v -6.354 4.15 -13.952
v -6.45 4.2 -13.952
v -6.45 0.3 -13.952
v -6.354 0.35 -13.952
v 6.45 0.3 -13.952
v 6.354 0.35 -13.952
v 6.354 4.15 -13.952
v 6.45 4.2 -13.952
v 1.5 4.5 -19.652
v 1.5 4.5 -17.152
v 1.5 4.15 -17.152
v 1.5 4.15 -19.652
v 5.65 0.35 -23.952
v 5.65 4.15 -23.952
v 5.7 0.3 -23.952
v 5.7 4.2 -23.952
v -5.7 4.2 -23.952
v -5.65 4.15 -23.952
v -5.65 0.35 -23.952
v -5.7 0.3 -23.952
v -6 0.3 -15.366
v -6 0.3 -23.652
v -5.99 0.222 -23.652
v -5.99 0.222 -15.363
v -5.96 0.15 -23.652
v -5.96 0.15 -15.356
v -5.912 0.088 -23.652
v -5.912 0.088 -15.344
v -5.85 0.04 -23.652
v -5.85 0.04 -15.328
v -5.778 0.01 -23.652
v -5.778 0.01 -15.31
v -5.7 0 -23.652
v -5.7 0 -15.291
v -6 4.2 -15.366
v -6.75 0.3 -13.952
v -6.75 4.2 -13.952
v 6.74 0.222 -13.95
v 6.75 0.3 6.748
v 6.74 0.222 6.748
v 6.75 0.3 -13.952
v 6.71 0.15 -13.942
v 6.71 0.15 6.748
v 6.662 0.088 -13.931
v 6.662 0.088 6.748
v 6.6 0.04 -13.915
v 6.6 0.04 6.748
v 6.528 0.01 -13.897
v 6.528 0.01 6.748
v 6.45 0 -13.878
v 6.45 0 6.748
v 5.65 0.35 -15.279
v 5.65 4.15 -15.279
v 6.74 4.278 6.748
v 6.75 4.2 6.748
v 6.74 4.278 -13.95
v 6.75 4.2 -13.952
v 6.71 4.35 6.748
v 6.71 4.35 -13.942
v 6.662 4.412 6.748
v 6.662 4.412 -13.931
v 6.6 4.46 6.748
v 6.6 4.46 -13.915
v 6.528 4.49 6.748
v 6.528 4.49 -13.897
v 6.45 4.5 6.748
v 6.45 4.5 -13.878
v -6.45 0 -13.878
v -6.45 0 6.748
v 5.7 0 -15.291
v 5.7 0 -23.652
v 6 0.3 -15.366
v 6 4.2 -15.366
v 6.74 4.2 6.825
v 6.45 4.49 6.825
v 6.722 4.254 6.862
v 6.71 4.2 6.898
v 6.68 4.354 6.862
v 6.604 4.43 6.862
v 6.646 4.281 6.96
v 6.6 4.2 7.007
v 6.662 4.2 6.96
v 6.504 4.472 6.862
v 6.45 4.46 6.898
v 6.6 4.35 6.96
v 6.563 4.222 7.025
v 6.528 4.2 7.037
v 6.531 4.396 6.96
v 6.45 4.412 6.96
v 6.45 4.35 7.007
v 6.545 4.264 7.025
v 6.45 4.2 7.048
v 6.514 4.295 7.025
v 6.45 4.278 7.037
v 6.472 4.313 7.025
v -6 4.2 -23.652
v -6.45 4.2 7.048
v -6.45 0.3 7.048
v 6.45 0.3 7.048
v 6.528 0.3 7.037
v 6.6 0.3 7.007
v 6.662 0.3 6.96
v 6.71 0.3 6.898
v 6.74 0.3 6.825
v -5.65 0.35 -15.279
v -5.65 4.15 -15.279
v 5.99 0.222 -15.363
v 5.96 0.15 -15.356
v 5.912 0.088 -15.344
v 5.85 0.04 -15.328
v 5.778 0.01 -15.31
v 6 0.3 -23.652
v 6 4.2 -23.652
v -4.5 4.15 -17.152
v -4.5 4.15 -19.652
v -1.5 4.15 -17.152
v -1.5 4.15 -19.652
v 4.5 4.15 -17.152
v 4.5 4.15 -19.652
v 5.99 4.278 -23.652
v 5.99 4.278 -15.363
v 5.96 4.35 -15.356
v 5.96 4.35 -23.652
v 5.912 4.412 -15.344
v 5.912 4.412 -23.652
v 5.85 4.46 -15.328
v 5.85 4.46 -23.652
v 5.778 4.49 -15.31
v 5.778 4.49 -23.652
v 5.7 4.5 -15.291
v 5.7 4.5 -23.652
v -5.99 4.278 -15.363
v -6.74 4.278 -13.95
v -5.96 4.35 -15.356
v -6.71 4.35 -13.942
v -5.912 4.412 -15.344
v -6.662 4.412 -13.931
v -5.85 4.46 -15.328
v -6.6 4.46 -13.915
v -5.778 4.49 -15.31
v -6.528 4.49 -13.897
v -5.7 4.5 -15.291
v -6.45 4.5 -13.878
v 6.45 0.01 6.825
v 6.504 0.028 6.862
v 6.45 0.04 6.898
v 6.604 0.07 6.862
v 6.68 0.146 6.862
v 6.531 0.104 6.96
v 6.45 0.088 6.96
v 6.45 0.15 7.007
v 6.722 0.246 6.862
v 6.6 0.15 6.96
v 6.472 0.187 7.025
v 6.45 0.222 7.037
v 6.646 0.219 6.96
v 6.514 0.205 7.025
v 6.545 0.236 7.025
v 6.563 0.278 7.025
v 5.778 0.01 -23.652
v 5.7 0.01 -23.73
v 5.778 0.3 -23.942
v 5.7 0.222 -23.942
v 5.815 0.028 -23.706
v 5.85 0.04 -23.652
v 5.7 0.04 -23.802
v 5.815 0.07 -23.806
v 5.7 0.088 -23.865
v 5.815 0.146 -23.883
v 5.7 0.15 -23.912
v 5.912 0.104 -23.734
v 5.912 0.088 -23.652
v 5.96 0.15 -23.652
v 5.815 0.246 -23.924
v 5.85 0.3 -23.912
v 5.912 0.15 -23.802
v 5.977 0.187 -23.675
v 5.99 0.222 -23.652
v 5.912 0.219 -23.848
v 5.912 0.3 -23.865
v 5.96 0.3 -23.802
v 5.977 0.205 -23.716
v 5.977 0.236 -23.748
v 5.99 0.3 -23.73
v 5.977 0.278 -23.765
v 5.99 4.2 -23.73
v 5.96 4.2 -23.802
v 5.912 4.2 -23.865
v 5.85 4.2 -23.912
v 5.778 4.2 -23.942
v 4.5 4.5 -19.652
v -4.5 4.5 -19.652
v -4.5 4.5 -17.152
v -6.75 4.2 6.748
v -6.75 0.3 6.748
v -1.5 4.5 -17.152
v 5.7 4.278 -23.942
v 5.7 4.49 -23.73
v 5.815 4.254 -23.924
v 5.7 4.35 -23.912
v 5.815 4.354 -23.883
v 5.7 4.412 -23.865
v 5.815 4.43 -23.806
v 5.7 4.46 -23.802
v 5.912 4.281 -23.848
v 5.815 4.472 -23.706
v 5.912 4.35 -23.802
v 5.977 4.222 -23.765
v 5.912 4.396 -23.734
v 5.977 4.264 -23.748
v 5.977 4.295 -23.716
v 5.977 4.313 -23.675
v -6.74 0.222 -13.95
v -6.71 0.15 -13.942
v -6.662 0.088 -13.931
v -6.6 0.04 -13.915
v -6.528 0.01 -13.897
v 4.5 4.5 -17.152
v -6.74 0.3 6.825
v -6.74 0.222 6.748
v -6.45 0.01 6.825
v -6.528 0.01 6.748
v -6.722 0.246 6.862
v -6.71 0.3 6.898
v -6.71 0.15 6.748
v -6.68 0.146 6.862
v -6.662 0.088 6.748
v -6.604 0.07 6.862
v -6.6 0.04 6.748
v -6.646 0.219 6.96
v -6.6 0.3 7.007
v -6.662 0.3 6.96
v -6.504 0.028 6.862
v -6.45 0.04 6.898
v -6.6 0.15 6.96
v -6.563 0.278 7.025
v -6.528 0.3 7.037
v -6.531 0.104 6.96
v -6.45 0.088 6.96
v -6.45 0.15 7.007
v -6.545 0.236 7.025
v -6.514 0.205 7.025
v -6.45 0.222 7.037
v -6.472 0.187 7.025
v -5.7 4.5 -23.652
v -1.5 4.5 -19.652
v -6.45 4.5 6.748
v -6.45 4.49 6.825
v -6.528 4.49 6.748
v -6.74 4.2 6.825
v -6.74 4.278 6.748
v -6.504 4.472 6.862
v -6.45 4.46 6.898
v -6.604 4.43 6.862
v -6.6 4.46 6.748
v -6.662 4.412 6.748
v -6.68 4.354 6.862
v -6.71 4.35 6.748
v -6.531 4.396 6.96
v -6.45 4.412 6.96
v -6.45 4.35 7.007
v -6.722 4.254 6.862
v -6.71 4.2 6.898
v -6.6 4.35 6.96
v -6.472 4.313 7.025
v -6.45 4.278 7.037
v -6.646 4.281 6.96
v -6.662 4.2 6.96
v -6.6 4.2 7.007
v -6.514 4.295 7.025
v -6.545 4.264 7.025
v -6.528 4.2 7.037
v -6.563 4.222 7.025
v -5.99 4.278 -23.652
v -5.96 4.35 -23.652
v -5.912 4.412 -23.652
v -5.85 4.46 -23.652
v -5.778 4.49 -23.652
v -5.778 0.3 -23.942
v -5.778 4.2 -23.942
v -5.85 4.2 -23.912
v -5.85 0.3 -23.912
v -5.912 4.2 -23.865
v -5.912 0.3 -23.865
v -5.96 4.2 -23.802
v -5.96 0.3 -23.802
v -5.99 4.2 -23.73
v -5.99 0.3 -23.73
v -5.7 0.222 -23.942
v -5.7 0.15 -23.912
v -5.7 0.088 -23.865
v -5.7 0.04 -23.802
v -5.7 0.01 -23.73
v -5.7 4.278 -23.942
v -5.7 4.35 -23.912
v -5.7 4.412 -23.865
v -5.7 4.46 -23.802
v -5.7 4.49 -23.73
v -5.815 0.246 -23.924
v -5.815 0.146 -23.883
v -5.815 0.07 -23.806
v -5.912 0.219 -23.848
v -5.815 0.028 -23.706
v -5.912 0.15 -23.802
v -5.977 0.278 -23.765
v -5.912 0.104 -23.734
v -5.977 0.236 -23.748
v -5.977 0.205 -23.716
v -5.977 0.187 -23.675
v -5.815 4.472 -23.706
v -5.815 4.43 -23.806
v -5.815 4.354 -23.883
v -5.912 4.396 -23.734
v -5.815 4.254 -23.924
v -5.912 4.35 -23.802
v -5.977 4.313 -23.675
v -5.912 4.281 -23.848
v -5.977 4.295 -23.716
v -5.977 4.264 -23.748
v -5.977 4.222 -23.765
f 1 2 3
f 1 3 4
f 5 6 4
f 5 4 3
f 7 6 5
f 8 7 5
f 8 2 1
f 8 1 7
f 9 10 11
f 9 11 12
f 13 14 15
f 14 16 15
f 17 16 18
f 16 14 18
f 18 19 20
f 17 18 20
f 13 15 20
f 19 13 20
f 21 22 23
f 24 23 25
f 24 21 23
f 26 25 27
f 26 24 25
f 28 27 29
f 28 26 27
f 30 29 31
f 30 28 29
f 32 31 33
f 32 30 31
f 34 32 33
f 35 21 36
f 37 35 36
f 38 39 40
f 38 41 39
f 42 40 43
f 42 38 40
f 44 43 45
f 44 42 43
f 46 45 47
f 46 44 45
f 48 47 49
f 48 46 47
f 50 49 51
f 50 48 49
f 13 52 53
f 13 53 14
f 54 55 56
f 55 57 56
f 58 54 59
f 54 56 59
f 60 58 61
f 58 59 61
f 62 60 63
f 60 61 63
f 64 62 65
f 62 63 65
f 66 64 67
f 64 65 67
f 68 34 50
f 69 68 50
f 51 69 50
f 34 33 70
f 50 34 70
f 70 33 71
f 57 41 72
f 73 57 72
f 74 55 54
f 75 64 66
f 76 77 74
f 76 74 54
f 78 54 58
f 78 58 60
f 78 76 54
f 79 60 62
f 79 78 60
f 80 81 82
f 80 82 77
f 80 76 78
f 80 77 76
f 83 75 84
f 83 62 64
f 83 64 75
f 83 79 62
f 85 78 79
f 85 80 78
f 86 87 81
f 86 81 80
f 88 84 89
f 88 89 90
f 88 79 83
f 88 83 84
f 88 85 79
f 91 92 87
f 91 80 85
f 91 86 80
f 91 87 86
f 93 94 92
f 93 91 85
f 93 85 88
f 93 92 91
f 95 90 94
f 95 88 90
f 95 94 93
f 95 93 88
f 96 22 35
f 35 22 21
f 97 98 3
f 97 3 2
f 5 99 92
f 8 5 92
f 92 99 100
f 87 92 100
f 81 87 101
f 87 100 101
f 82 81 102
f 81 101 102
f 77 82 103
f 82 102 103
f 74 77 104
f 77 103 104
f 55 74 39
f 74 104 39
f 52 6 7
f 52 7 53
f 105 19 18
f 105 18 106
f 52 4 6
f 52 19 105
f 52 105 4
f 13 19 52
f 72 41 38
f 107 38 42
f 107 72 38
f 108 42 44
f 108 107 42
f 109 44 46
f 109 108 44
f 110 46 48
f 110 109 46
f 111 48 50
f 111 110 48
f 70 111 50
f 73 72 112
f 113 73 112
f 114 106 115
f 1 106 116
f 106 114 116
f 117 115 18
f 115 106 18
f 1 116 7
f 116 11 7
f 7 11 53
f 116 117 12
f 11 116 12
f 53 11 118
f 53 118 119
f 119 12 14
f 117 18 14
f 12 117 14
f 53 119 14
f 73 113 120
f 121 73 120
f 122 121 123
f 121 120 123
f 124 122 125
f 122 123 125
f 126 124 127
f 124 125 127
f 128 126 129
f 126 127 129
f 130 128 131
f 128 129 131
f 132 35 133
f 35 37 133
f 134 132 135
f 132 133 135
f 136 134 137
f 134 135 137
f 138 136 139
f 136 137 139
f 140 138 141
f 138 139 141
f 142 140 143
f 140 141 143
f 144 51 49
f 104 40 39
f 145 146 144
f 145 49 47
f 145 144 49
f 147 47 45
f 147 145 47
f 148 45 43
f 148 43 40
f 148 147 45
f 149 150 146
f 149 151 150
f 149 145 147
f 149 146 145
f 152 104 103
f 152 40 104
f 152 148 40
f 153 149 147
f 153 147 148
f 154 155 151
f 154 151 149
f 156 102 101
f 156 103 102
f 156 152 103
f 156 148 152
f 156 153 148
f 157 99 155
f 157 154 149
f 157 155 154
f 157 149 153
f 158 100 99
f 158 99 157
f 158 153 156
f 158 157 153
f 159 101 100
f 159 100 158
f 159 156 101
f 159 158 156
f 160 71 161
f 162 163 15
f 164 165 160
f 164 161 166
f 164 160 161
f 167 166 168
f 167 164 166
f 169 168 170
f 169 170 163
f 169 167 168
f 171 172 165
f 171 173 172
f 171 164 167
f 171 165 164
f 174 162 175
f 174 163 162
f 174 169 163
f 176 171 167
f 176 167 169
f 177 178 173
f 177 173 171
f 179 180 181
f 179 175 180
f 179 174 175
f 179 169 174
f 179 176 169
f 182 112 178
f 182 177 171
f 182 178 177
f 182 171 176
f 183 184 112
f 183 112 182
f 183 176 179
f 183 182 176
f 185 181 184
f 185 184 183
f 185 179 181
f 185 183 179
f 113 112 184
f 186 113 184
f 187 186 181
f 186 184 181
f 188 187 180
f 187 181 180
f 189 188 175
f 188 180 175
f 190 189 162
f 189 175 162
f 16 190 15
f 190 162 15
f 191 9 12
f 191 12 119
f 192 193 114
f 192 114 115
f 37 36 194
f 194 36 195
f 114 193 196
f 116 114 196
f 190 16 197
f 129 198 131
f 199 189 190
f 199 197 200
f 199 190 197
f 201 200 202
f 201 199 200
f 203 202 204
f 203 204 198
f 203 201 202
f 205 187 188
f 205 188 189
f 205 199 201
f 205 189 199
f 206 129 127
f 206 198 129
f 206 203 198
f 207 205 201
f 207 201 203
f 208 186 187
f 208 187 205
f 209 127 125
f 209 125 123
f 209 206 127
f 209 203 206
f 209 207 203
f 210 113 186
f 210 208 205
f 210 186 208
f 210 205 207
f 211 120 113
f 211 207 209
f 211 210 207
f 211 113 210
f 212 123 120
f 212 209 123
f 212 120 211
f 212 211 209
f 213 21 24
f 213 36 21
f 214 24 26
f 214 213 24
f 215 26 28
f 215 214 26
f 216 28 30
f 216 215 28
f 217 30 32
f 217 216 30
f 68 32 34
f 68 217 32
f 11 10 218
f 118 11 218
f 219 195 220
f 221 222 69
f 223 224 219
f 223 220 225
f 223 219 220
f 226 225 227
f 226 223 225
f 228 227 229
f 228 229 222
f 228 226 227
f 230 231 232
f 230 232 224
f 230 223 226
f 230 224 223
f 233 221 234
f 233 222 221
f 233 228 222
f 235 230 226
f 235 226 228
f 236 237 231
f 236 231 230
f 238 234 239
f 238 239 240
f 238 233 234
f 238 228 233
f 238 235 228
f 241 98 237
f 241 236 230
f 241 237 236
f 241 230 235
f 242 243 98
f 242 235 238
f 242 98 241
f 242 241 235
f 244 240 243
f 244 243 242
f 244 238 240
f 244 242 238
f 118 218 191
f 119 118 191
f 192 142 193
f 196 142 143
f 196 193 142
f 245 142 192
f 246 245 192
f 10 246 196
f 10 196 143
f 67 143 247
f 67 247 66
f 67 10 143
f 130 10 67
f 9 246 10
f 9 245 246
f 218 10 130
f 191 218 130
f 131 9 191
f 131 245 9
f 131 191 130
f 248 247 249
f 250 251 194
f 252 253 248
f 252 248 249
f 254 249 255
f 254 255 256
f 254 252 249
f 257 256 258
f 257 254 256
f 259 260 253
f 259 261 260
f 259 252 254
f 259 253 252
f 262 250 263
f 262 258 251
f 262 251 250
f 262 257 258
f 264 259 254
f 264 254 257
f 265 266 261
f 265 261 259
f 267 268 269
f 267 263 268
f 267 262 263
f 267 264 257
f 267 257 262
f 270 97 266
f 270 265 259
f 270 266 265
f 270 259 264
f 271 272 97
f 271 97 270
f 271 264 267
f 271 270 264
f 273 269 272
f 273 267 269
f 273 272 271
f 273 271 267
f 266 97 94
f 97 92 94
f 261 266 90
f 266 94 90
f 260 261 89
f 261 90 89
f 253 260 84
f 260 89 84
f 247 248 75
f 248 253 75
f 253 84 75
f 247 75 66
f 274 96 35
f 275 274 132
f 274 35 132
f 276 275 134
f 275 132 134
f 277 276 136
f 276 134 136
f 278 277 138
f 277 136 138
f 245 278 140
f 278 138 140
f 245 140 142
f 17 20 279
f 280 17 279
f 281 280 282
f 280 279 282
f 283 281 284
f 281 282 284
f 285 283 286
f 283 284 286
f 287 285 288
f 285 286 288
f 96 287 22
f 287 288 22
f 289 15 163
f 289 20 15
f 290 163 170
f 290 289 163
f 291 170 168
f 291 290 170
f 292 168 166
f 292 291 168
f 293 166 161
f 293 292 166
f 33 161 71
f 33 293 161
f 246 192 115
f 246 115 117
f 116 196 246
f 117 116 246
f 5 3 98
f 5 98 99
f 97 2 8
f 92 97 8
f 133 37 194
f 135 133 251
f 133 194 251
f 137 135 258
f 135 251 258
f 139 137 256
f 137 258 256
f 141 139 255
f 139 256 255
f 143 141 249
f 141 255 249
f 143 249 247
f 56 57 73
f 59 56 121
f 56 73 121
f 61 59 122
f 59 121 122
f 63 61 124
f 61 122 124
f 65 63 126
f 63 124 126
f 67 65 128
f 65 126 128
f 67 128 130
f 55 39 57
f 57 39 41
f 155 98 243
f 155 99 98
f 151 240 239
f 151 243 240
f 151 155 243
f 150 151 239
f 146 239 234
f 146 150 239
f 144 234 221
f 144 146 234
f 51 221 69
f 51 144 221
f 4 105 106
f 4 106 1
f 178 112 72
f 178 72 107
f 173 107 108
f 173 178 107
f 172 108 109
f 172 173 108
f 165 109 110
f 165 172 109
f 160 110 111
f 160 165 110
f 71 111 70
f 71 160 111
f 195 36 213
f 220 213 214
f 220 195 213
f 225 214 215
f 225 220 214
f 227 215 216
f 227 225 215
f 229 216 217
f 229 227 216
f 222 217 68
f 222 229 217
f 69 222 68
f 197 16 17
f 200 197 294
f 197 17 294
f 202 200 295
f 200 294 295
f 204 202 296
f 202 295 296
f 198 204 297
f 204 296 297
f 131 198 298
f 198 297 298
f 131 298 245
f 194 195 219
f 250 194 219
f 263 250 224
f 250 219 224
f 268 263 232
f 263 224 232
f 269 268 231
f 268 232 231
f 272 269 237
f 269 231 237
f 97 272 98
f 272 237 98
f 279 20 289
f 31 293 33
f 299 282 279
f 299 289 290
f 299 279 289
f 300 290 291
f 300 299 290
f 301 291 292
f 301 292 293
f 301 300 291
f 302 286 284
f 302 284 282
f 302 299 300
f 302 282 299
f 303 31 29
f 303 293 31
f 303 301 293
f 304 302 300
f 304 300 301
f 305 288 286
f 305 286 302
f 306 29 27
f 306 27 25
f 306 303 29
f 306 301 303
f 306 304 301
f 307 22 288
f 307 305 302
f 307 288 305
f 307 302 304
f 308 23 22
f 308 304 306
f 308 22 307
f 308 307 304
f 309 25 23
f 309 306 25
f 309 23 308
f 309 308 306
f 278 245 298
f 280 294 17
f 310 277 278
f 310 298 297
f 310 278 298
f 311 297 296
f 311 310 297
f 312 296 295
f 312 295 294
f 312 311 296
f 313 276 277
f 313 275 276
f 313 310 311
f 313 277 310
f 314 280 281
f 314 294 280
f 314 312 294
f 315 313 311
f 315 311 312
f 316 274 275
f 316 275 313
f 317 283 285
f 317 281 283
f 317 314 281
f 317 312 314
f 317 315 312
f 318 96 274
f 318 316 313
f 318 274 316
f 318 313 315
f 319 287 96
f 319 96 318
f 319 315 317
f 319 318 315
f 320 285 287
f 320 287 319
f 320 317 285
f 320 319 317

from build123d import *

# Parameters (mm, degrees)
BOSS_EXTRUDE1_DEPTH = 4.5
FILLET1_R           = 0.3
FILLET2_R           = 0.3
SHELL3_START        = 0.35
SHELL3_DEPTH        = 3.8
SKETCH3_W           = 12.9
SKETCH3_H           = 3.9
CUT_EXTRUDE1_DEPTH  = 21
CUT_EXTRUDE2_REACH  = 27.289
SKETCH4_W           = 3
SKETCH4_H           = 2.5


# Read off the part's stored shape, not the designer's step: Shell3
with BuildPart() as part:
    # Sketch1 → Boss-Extrude1 (new body)
    with BuildSketch(Plane(origin=(0, 0, 0), x_dir=(1, 0, 0), z_dir=(0, 1, 0))):
        Polygon((-6.75, -7.047619048), (6.75, -7.047619048), (6.75, 13.952380952), (6, 15.365710355), (6, 23.952380952), (-6, 23.952380952), (-6, 15.365710355), (-6.75, 13.952380952), align=None)
    extrude(amount=BOSS_EXTRUDE1_DEPTH)

    # Fillet1
    fillet1_edges = [part.edges().sort_by_distance(p)[0] for p in [
        (6, 4.5, -19.659045654),
        (6.375, 0, -14.659045654),
        (6.75, 0, -3.452380952),
        (0, 4.5, -23.952380952),
        (-6, 4.5, -19.659045654),
        (-6.375, 4.5, -14.659045654),
        (-6.75, 4.5, -3.452380952),
        (0, 4.5, 7.047619048),
        (6.75, 4.5, -3.452380952),
        (6.375, 4.5, -14.659045654),
        (0, 0, 7.047619048),
        (-6.75, 0, -3.452380952),
        (-6.375, 0, -14.659045654),
        (-6, 0, -19.659045654),
        (0, 0, -23.952380952),
        (6, 0, -19.659045654),
    ]]
    fillet(fillet1_edges, radius=FILLET1_R)

    # Fillet2
    # the kernel refuses this fillet: 0.3 mm, written as the material it takes off along each edge
    with BuildSketch(Plane(origin=(-6.45, 0.3, 6.747619048), x_dir=(-1, 0, 0), z_dir=(0, 0, 1))) as fillet2_piece_1_section:
        Polygon((0, 0), (FILLET2_R, 0), (FILLET2_R, FILLET2_R), (0, FILLET2_R), align=None)
    fillet2_piece_1 = extrude(amount=FILLET2_R, mode=Mode.PRIVATE)
    fillet2_piece_1 = fillet2_piece_1 - Plane(origin=(-6.45, 0.3, 6.747619048), x_dir=(0.7071067811865475, 0.7071067811865475, 0), z_dir=(0, 0, 1)) * Sphere(FILLET2_R, mode=Mode.PRIVATE)
    add(fillet2_piece_1, mode=Mode.SUBTRACT)
    with BuildSketch(Plane(origin=(-5.7, 0.3, -23.652380952), x_dir=(0, 0, -1), z_dir=(-1, 0, 0))) as fillet2_piece_2_section:
        Polygon((0, 0), (FILLET2_R, 0), (FILLET2_R, FILLET2_R), (0, FILLET2_R), align=None)
    fillet2_piece_2 = extrude(amount=FILLET2_R, mode=Mode.PRIVATE)
    fillet2_piece_2 = fillet2_piece_2 - Plane(origin=(-5.7, 0.3, -23.652380952), x_dir=(0, 0.7071067811865475, 0.7071067811865475), z_dir=(-1, 0, 0)) * Sphere(FILLET2_R, mode=Mode.PRIVATE)
    add(fillet2_piece_2, mode=Mode.SUBTRACT)
    with BuildSketch(Plane(origin=(6.45, 0.3, 6.747619048), x_dir=(1, 0, 0), z_dir=(0, 0, 1))) as fillet2_piece_3_section:
        Polygon((0, 0), (FILLET2_R, 0), (FILLET2_R, -FILLET2_R), (0, -FILLET2_R), align=None)
    fillet2_piece_3 = extrude(amount=FILLET2_R, mode=Mode.PRIVATE)
    fillet2_piece_3 = fillet2_piece_3 - Plane(origin=(6.45, 0.3, 6.747619048), x_dir=(-0.7071067811865475, 0.7071067811865475, 0), z_dir=(0, 0, 1)) * Sphere(FILLET2_R, mode=Mode.PRIVATE)
    add(fillet2_piece_3, mode=Mode.SUBTRACT)
    with BuildSketch(Plane(origin=(5.7, 0.3, -23.652380952), x_dir=(0, 0, -1), z_dir=(1, 0, 0))) as fillet2_piece_4_section:
        Polygon((0, 0), (FILLET2_R, 0), (FILLET2_R, -FILLET2_R), (0, -FILLET2_R), align=None)
    fillet2_piece_4 = extrude(amount=FILLET2_R, mode=Mode.PRIVATE)
    fillet2_piece_4 = fillet2_piece_4 - Plane(origin=(5.7, 0.3, -23.652380952), x_dir=(0, 0.7071067811865475, 0.7071067811865475), z_dir=(1, 0, 0)) * Sphere(FILLET2_R, mode=Mode.PRIVATE)
    add(fillet2_piece_4, mode=Mode.SUBTRACT)
    with BuildSketch(Plane(origin=(-5.7, 4.2, -23.652380952), x_dir=(0, 0, -1), z_dir=(-1, 0, 0))) as fillet2_piece_5_section:
        Polygon((0, 0), (FILLET2_R, 0), (FILLET2_R, -FILLET2_R), (0, -FILLET2_R), align=None)
    fillet2_piece_5 = extrude(amount=FILLET2_R, mode=Mode.PRIVATE)
    fillet2_piece_5 = fillet2_piece_5 - Plane(origin=(-5.7, 4.2, -23.652380952), x_dir=(0, -0.7071067811865475, 0.7071067811865475), z_dir=(-1, 0, 0)) * Sphere(FILLET2_R, mode=Mode.PRIVATE)
    add(fillet2_piece_5, mode=Mode.SUBTRACT)
    with BuildSketch(Plane(origin=(5.7, 4.2, -23.652380952), x_dir=(0, 0, -1), z_dir=(1, 0, 0))) as fillet2_piece_6_section:
        Polygon((0, 0), (FILLET2_R, 0), (FILLET2_R, FILLET2_R), (0, FILLET2_R), align=None)
    fillet2_piece_6 = extrude(amount=FILLET2_R, mode=Mode.PRIVATE)
    fillet2_piece_6 = fillet2_piece_6 - Plane(origin=(5.7, 4.2, -23.652380952), x_dir=(0, -0.7071067811865475, 0.7071067811865475), z_dir=(1, 0, 0)) * Sphere(FILLET2_R, mode=Mode.PRIVATE)
    add(fillet2_piece_6, mode=Mode.SUBTRACT)
    with BuildSketch(Plane(origin=(-6.45, 4.2, 6.747619048), x_dir=(-1, 0, 0), z_dir=(0, 0, 1))) as fillet2_piece_7_section:
        Polygon((0, 0), (FILLET2_R, 0), (FILLET2_R, -FILLET2_R), (0, -FILLET2_R), align=None)
    fillet2_piece_7 = extrude(amount=FILLET2_R, mode=Mode.PRIVATE)
    fillet2_piece_7 = fillet2_piece_7 - Plane(origin=(-6.45, 4.2, 6.747619048), x_dir=(0.7071067811865475, -0.7071067811865475, 0), z_dir=(0, 0, 1)) * Sphere(FILLET2_R, mode=Mode.PRIVATE)
    add(fillet2_piece_7, mode=Mode.SUBTRACT)
    with BuildSketch(Plane(origin=(6.45, 4.2, 6.747619048), x_dir=(1, 0, 0), z_dir=(0, 0, 1))) as fillet2_piece_8_section:
        Polygon((0, 0), (FILLET2_R, 0), (FILLET2_R, FILLET2_R), (0, FILLET2_R), align=None)
    fillet2_piece_8 = extrude(amount=FILLET2_R, mode=Mode.PRIVATE)
    fillet2_piece_8 = fillet2_piece_8 - Plane(origin=(6.45, 4.2, 6.747619048), x_dir=(-0.7071067811865475, -0.7071067811865475, 0), z_dir=(0, 0, 1)) * Sphere(FILLET2_R, mode=Mode.PRIVATE)
    add(fillet2_piece_8, mode=Mode.SUBTRACT)
    with BuildSketch(Plane(origin=(6, 0.3, -23.952380952), x_dir=(0, 0, 1), z_dir=(0, 1, 0)), Plane(origin=(6.75, 0.3, 7.047619048), x_dir=(-1, 0, 0), z_dir=(0, 1, 0))) as fillet2_piece_9:
        with BuildLine():
            CenterArc((FILLET2_R, -FILLET2_R), FILLET2_R, 90, 90)
            Line((0, -FILLET2_R), (0, 0))
            Line((0, 0), (FILLET2_R, 0))
        make_face()
    extrude(amount=3.9, mode=Mode.SUBTRACT)
    with BuildSketch(Plane(origin=(-6, 0.3, -23.952380952), x_dir=(0, 0, 1), z_dir=(0, 1, 0)), Plane(origin=(-6.75, 0.3, 7.047619048), x_dir=(1, 0, 0), z_dir=(0, 1, 0))) as fillet2_piece_10:
        with BuildLine():
            CenterArc((FILLET2_R, FILLET2_R), FILLET2_R, 180, 90)
            Line((0, FILLET2_R), (0, 0))
            Line((0, 0), (FILLET2_R, 0))
        make_face()
    extrude(amount=3.9, mode=Mode.SUBTRACT)

    # Shell3 outline → Shell3 (cut)
    with BuildSketch(Plane(origin=(0, 0, 0), x_dir=(1, 0, 0), z_dir=(0, 1, 0)).offset(SHELL3_START)):
        Polygon((6.4, -6.697619048), (6.4, 13.865268007), (5.65, 15.278597409), (5.65, 23.952380952), (-5.65, 23.952380952), (-5.65, 15.278597409), (-6.4, 13.865268007), (-6.4, -6.697619048), align=None)
    extrude(amount=SHELL3_DEPTH, mode=Mode.SUBTRACT)

    # Sketch3 → Cut-Extrude1 (cut)
    with BuildSketch(Plane.XY.offset(7.047619048)):
        with Locations((0, 2.25)):
            Rectangle(SKETCH3_W, SKETCH3_H)
    extrude(amount=-CUT_EXTRUDE1_DEPTH, mode=Mode.SUBTRACT)

    # Sketch4 → Cut-Extrude2 (cut, up to next)
    with BuildSketch(Plane(origin=(0, 4.5, 0), x_dir=(1, 0, 0), z_dir=(0, 1, 0)), mode=Mode.PRIVATE) as cut_extrude2_sk1:
        with Locations((3, 18.402380952)):
            Rectangle(SKETCH4_W, SKETCH4_H)
    cut_extrude2_tool1 = extrude(cut_extrude2_sk1.sketch, amount=-CUT_EXTRUDE2_REACH, mode=Mode.PRIVATE) & part.part
    # Sketch4 → Cut-Extrude2 (cut, up to next)
    with BuildSketch(Plane(origin=(0, 4.5, 0), x_dir=(1, 0, 0), z_dir=(0, 1, 0)), mode=Mode.PRIVATE) as cut_extrude2_sk2:
        with Locations((-3, 18.402380952)):
            Rectangle(SKETCH4_W, SKETCH4_H)
    cut_extrude2_tool2 = extrude(cut_extrude2_sk2.sketch, amount=-CUT_EXTRUDE2_REACH, mode=Mode.PRIVATE) & part.part
    add(cut_extrude2_tool1.solids().sort_by_distance((3, 4.5, -18.402381))[0], mode=Mode.SUBTRACT)
    add(cut_extrude2_tool2.solids().sort_by_distance((-3, 4.5, -18.402381))[0], mode=Mode.SUBTRACT)


solid = part.part
